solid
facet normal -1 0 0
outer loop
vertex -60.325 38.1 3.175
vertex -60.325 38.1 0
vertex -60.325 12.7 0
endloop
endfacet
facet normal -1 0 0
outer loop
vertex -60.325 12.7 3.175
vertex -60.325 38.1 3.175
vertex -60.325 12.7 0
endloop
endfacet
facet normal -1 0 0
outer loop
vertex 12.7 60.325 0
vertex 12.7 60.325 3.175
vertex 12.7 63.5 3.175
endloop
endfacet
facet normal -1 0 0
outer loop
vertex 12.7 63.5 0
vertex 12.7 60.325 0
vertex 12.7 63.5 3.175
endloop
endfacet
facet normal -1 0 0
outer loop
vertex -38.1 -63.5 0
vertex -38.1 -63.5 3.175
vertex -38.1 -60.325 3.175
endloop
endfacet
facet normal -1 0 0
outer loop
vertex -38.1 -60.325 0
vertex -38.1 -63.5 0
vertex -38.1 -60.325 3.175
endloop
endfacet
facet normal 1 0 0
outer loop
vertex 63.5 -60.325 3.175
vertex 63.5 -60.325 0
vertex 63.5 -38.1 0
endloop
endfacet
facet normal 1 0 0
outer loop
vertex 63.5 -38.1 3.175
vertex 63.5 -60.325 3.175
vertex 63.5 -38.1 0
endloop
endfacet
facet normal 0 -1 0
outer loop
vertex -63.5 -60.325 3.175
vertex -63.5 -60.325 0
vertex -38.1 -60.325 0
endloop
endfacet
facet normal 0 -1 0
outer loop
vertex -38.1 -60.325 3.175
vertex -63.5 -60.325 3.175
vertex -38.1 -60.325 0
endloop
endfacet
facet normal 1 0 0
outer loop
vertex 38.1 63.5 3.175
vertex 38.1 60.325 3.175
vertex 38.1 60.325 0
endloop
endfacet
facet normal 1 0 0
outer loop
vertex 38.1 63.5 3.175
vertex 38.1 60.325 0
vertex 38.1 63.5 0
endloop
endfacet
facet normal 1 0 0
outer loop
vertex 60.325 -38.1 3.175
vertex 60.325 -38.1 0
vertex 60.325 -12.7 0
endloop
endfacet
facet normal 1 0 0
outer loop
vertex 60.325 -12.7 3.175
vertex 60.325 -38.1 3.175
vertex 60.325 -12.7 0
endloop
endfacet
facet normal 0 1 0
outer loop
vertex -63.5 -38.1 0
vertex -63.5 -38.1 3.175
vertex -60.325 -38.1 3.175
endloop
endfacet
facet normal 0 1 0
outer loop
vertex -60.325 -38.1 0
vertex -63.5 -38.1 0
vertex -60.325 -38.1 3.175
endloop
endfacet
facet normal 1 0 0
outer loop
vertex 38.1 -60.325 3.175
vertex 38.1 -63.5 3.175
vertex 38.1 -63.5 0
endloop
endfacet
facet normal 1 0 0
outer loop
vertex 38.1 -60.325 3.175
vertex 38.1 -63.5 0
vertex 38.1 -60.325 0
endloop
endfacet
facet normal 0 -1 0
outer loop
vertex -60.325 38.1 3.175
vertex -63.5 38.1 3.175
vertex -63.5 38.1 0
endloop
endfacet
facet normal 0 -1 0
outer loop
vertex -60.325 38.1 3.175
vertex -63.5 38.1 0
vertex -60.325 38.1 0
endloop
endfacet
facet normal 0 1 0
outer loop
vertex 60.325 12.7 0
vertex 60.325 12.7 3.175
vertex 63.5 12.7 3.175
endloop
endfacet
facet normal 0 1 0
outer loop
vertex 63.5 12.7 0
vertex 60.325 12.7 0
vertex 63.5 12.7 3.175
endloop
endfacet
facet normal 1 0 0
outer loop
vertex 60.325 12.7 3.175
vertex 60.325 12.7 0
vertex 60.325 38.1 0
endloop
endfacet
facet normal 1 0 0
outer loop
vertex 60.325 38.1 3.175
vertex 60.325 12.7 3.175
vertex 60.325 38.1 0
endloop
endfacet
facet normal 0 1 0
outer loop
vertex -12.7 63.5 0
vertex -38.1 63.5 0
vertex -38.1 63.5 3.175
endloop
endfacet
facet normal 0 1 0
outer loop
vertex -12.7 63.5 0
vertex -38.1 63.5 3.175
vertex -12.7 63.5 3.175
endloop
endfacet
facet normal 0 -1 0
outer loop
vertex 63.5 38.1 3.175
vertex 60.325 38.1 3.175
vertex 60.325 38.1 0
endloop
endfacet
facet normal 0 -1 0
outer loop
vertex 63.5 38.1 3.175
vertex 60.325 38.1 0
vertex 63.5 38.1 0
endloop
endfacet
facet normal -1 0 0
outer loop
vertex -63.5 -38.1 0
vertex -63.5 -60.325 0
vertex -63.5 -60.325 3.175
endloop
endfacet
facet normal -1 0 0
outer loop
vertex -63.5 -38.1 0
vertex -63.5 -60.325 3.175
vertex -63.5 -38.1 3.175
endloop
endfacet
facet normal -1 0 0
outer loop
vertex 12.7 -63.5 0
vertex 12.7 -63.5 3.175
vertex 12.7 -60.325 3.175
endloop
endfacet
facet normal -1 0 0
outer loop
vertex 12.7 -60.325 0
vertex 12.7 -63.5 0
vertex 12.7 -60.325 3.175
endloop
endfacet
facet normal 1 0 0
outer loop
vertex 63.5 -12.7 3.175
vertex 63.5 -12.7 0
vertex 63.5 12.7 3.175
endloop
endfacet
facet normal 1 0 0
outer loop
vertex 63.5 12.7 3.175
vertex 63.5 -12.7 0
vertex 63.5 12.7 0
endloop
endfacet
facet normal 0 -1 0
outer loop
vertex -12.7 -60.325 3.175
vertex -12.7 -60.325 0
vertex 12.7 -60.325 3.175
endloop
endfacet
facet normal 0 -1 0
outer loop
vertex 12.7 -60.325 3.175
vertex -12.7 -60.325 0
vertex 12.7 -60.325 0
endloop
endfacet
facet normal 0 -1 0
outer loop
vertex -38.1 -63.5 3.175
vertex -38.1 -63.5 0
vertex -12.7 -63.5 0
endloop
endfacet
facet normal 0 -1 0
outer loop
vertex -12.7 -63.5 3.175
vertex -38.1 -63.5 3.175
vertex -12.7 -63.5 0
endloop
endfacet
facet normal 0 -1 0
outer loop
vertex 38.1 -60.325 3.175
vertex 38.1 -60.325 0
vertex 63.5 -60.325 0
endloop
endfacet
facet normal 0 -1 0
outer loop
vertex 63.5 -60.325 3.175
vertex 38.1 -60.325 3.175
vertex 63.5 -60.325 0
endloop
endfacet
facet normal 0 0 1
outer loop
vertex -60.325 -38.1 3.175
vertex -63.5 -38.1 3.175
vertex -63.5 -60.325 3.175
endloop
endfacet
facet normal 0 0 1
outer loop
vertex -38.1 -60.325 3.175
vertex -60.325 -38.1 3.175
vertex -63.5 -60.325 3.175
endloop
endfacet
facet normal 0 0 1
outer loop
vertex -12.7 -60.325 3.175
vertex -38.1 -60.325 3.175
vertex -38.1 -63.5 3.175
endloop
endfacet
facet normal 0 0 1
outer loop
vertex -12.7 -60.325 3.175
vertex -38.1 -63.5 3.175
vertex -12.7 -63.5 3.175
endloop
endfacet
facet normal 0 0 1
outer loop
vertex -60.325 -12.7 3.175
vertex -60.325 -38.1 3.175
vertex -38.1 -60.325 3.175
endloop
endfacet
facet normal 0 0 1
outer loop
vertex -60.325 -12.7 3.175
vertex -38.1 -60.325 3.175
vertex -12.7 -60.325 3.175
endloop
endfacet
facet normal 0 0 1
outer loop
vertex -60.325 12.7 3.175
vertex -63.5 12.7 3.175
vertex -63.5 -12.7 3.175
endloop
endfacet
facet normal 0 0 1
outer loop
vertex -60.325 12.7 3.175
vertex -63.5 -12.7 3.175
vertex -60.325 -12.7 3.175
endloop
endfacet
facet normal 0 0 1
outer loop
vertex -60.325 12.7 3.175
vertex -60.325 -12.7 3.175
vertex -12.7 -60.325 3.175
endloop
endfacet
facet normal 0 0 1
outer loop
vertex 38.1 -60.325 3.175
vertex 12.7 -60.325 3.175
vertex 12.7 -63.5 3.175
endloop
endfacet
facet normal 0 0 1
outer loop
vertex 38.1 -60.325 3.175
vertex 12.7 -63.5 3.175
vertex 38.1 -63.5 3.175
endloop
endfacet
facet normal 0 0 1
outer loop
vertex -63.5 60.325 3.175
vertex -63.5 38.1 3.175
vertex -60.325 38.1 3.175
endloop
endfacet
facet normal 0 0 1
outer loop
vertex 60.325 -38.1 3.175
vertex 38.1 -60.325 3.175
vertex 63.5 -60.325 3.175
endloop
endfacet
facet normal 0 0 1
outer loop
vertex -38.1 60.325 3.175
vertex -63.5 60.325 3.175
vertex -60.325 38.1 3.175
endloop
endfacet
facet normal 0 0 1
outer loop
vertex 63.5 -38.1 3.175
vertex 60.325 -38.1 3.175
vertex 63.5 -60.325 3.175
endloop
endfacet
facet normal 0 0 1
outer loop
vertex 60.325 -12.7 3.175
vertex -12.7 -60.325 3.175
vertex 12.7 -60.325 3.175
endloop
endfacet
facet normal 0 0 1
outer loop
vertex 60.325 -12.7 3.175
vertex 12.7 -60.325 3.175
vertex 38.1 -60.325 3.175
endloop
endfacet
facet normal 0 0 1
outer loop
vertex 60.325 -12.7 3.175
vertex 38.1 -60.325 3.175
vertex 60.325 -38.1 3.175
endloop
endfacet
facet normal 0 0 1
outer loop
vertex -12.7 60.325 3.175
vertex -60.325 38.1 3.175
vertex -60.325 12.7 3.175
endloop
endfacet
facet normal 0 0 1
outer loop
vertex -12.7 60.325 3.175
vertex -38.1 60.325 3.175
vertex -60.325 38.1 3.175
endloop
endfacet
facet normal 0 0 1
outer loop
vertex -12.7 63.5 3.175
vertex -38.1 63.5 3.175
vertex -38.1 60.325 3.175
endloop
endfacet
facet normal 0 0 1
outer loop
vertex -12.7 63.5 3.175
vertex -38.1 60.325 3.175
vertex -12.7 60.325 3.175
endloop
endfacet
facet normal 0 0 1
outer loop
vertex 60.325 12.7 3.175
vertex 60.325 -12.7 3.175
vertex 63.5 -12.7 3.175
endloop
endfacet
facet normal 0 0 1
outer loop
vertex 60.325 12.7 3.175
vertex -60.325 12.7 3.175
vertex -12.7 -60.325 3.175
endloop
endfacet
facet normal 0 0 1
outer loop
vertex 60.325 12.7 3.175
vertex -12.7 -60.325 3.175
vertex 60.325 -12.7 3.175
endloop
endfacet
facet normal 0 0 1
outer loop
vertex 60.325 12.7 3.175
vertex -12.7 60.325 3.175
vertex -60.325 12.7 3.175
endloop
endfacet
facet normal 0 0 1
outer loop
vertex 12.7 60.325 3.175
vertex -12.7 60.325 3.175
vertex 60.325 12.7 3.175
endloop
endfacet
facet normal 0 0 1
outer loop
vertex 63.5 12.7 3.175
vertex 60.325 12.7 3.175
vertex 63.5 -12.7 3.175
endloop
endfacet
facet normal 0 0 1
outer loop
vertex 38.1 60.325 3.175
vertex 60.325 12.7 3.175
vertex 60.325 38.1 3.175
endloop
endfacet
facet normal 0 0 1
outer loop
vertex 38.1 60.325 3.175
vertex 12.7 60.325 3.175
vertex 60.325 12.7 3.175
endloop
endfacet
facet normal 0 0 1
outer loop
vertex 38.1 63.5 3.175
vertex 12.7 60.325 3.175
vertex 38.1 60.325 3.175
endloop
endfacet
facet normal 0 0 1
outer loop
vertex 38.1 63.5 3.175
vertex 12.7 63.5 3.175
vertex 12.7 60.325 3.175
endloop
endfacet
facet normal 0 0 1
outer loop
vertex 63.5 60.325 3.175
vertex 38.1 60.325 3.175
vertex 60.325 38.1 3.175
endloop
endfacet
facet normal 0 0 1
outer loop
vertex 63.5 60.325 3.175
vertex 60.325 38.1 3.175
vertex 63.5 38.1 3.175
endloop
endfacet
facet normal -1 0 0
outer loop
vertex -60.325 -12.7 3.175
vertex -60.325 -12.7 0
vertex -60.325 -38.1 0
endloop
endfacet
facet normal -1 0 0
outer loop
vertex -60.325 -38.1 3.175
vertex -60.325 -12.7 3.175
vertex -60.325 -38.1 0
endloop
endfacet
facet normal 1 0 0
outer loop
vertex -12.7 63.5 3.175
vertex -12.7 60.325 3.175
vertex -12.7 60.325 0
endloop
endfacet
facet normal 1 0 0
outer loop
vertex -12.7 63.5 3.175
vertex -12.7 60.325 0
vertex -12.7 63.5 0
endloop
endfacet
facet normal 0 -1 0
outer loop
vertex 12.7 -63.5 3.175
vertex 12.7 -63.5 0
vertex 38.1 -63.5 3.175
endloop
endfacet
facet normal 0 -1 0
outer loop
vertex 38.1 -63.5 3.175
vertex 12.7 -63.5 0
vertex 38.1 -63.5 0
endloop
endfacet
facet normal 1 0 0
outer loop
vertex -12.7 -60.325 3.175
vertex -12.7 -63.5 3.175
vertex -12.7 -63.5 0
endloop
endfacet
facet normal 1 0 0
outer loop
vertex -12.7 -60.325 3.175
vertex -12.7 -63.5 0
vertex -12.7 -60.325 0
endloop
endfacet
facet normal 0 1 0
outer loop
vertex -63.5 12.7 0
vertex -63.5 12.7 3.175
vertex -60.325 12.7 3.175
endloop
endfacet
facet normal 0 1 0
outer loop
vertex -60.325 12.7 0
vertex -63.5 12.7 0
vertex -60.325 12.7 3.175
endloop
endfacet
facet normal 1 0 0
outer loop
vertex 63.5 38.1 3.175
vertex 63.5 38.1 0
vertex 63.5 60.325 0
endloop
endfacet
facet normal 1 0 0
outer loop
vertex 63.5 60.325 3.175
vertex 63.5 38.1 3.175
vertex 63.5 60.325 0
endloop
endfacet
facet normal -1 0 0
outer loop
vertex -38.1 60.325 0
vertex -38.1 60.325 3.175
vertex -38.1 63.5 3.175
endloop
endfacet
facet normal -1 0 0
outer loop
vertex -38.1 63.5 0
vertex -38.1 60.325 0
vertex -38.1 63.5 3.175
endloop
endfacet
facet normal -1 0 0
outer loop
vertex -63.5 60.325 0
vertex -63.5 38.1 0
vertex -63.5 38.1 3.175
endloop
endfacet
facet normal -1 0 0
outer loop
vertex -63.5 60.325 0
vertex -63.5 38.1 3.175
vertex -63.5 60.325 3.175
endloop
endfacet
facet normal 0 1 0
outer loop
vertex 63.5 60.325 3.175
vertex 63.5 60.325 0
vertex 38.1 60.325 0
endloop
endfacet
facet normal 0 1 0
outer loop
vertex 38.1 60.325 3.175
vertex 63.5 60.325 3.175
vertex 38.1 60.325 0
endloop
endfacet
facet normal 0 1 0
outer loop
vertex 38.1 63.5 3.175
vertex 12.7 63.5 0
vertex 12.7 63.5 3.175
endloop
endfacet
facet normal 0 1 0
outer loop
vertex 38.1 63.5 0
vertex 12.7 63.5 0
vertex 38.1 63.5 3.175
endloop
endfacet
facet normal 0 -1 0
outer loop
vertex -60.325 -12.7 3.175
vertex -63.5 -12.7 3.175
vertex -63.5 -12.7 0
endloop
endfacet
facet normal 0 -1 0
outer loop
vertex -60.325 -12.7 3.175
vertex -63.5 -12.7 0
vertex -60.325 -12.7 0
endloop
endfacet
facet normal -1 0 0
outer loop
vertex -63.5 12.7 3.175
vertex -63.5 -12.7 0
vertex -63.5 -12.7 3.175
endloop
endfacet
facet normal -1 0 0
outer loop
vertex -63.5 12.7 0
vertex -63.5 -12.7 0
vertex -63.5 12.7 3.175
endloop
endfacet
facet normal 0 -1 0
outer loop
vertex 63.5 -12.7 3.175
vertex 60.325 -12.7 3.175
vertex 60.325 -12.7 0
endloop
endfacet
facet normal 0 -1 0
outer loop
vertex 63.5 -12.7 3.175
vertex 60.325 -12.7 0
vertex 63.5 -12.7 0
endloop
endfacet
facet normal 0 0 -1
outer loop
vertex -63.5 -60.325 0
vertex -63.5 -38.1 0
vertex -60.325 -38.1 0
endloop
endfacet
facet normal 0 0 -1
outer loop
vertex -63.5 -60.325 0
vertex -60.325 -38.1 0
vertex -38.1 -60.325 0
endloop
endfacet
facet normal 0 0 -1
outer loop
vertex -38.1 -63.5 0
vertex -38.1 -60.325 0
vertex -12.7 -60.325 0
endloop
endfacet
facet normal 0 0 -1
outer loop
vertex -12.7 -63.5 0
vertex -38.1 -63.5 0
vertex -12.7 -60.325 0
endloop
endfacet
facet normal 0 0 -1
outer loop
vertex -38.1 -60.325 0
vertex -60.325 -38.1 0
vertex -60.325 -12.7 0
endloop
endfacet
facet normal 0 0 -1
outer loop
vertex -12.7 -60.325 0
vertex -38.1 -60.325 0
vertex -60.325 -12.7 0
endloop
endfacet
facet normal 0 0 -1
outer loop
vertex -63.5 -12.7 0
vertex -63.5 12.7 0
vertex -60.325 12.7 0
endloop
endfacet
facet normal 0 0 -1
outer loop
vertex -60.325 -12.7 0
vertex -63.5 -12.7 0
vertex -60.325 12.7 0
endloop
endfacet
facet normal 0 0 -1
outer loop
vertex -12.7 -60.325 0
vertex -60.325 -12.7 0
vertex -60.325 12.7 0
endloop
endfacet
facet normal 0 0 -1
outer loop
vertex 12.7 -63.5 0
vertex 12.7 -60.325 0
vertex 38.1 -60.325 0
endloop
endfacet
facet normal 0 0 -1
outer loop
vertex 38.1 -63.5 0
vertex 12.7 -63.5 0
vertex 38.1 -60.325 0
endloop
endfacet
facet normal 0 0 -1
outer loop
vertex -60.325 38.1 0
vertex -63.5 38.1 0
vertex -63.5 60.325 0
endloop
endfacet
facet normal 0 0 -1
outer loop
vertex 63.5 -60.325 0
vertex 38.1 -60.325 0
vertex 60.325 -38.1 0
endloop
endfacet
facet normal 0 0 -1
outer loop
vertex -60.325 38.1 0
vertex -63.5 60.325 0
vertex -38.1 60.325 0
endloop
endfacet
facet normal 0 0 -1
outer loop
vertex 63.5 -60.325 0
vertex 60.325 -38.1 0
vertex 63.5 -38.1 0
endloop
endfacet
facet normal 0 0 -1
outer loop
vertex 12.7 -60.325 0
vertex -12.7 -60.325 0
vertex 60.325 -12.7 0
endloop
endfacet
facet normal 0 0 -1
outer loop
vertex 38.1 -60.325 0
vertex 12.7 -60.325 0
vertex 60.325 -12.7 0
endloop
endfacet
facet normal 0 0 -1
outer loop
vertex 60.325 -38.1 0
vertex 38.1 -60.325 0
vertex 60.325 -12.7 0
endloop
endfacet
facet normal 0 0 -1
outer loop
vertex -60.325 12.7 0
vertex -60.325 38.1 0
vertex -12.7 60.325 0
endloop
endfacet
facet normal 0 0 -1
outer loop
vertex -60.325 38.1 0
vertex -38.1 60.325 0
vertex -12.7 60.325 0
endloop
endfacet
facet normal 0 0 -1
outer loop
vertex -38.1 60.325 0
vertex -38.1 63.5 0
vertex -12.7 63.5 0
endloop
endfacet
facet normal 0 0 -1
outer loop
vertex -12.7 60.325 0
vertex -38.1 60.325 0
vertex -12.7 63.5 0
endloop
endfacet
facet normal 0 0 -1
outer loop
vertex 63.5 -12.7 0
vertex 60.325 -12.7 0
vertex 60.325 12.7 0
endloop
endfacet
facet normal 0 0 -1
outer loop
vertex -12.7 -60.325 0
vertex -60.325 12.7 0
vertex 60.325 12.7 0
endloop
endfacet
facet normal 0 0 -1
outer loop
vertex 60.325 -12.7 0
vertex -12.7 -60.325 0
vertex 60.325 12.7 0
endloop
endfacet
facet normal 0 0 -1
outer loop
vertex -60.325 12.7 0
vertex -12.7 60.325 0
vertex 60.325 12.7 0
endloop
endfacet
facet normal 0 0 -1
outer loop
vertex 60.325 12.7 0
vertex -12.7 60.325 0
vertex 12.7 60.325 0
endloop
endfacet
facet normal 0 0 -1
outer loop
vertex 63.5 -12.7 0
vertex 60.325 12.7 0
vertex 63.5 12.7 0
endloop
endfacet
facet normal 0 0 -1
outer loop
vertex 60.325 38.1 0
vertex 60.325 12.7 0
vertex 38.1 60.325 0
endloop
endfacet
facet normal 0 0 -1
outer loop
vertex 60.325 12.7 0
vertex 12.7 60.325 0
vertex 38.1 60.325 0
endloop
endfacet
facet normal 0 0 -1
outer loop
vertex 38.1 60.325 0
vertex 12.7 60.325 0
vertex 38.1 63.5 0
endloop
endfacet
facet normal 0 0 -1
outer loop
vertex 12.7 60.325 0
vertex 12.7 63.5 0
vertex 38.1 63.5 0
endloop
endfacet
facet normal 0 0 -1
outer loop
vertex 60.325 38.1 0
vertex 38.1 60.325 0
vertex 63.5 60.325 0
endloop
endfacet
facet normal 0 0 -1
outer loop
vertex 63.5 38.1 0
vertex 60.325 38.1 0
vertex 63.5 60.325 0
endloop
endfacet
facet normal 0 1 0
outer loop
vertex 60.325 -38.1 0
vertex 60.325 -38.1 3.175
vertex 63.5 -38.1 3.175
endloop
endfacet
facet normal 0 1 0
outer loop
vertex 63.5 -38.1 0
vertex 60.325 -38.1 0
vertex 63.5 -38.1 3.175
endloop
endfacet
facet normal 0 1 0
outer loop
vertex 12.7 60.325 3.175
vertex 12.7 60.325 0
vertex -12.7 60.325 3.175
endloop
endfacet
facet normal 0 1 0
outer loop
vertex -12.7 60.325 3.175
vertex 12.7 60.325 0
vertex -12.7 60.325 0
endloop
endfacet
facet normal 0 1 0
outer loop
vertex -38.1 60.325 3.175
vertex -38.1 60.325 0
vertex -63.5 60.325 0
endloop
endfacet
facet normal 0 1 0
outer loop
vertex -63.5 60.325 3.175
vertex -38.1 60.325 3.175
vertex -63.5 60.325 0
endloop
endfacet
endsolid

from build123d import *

# Parameters (mm, degrees)
F0_W     = 22.225
F0_H     = 22.225
F0_W_2   = 25.4
F0_H_2   = 25.4
F0_W_3   = 3.175
F0_H_3   = 3.175
F1_DEPTH = 3.175


with BuildPart() as f1:
    # F0 (on Top) → F1 (new body)
    with BuildSketch(Plane.XY):
        with Locations((-49.2125, 49.2125)):
            Rectangle(F0_W, F0_H)
        with Locations((-25.4, 49.2125)):
            Rectangle(F0_W_2, F0_H)
        with Locations((25.4, 49.2125)):
            Rectangle(F0_W_2, F0_H)
        with Locations((49.2125, 49.2125)):
            Rectangle(F0_W, F0_H)
        with Locations((49.2125, 25.4)):
            Rectangle(F0_W, F0_H_2)
        with Locations((25.4, 25.4)):
            Rectangle(F0_W_2, F0_H_2)
        with Locations((0, 25.4)):
            Rectangle(F0_W_2, F0_H_2)
        with Locations((-25.4, 25.4)):
            Rectangle(F0_W_2, F0_H_2)
        with Locations((-49.2125, 25.4)):
            Rectangle(F0_W, F0_H_2)
        with Locations((-49.2125, 0)):
            Rectangle(F0_W, F0_H_2)
        with Locations((-25.4, 0)):
            Rectangle(F0_W_2, F0_H_2)
        Rectangle(F0_W_2, F0_H_2)
        with Locations((25.4, 0)):
            Rectangle(F0_W_2, F0_H_2)
        with Locations((49.2125, 0)):
            Rectangle(F0_W, F0_H_2)
        with Locations((49.2125, -25.4)):
            Rectangle(F0_W, F0_H_2)
        with Locations((25.4, -25.4)):
            Rectangle(F0_W_2, F0_H_2)
        with Locations((0, -25.4)):
            Rectangle(F0_W_2, F0_H_2)
        with Locations((-25.4, -25.4)):
            Rectangle(F0_W_2, F0_H_2)
        with Locations((-49.2125, -25.4)):
            Rectangle(F0_W, F0_H_2)
        with Locations((-49.2125, -49.2125)):
            Rectangle(F0_W, F0_H)
        with Locations((-25.4, -49.2125)):
            Rectangle(F0_W_2, F0_H)
        with Locations((25.4, -49.2125)):
            Rectangle(F0_W_2, F0_H)
        with Locations((49.2125, -49.2125)):
            Rectangle(F0_W, F0_H)
        with Locations((0, 49.2125)):
            Rectangle(F0_W_2, F0_H)
        with Locations((0, -49.2125)):
            Rectangle(F0_W_2, F0_H)
        with Locations((-61.9125, -49.2125)):
            Rectangle(F0_W_3, F0_H)
        with Locations((-61.9125, 0)):
            Rectangle(F0_W_3, F0_H_2)
        with Locations((-61.9125, 49.2125)):
            Rectangle(F0_W_3, F0_H)
        with Locations((61.9125, 49.2125)):
            Rectangle(F0_W_3, F0_H)
        with Locations((61.9125, 0)):
            Rectangle(F0_W_3, F0_H_2)
        with Locations((61.9125, -49.2125)):
            Rectangle(F0_W_3, F0_H)
        with Locations((-25.4, -61.9125)):
            Rectangle(F0_W_2, F0_H_3)
        with Locations((25.4, -61.9125)):
            Rectangle(F0_W_2, F0_H_3)
        with Locations((-25.4, 61.9125)):
            Rectangle(F0_W_2, F0_H_3)
        with Locations((25.4, 61.9125)):
            Rectangle(F0_W_2, F0_H_3)
    extrude(amount=F1_DEPTH)


solid = f1.part
